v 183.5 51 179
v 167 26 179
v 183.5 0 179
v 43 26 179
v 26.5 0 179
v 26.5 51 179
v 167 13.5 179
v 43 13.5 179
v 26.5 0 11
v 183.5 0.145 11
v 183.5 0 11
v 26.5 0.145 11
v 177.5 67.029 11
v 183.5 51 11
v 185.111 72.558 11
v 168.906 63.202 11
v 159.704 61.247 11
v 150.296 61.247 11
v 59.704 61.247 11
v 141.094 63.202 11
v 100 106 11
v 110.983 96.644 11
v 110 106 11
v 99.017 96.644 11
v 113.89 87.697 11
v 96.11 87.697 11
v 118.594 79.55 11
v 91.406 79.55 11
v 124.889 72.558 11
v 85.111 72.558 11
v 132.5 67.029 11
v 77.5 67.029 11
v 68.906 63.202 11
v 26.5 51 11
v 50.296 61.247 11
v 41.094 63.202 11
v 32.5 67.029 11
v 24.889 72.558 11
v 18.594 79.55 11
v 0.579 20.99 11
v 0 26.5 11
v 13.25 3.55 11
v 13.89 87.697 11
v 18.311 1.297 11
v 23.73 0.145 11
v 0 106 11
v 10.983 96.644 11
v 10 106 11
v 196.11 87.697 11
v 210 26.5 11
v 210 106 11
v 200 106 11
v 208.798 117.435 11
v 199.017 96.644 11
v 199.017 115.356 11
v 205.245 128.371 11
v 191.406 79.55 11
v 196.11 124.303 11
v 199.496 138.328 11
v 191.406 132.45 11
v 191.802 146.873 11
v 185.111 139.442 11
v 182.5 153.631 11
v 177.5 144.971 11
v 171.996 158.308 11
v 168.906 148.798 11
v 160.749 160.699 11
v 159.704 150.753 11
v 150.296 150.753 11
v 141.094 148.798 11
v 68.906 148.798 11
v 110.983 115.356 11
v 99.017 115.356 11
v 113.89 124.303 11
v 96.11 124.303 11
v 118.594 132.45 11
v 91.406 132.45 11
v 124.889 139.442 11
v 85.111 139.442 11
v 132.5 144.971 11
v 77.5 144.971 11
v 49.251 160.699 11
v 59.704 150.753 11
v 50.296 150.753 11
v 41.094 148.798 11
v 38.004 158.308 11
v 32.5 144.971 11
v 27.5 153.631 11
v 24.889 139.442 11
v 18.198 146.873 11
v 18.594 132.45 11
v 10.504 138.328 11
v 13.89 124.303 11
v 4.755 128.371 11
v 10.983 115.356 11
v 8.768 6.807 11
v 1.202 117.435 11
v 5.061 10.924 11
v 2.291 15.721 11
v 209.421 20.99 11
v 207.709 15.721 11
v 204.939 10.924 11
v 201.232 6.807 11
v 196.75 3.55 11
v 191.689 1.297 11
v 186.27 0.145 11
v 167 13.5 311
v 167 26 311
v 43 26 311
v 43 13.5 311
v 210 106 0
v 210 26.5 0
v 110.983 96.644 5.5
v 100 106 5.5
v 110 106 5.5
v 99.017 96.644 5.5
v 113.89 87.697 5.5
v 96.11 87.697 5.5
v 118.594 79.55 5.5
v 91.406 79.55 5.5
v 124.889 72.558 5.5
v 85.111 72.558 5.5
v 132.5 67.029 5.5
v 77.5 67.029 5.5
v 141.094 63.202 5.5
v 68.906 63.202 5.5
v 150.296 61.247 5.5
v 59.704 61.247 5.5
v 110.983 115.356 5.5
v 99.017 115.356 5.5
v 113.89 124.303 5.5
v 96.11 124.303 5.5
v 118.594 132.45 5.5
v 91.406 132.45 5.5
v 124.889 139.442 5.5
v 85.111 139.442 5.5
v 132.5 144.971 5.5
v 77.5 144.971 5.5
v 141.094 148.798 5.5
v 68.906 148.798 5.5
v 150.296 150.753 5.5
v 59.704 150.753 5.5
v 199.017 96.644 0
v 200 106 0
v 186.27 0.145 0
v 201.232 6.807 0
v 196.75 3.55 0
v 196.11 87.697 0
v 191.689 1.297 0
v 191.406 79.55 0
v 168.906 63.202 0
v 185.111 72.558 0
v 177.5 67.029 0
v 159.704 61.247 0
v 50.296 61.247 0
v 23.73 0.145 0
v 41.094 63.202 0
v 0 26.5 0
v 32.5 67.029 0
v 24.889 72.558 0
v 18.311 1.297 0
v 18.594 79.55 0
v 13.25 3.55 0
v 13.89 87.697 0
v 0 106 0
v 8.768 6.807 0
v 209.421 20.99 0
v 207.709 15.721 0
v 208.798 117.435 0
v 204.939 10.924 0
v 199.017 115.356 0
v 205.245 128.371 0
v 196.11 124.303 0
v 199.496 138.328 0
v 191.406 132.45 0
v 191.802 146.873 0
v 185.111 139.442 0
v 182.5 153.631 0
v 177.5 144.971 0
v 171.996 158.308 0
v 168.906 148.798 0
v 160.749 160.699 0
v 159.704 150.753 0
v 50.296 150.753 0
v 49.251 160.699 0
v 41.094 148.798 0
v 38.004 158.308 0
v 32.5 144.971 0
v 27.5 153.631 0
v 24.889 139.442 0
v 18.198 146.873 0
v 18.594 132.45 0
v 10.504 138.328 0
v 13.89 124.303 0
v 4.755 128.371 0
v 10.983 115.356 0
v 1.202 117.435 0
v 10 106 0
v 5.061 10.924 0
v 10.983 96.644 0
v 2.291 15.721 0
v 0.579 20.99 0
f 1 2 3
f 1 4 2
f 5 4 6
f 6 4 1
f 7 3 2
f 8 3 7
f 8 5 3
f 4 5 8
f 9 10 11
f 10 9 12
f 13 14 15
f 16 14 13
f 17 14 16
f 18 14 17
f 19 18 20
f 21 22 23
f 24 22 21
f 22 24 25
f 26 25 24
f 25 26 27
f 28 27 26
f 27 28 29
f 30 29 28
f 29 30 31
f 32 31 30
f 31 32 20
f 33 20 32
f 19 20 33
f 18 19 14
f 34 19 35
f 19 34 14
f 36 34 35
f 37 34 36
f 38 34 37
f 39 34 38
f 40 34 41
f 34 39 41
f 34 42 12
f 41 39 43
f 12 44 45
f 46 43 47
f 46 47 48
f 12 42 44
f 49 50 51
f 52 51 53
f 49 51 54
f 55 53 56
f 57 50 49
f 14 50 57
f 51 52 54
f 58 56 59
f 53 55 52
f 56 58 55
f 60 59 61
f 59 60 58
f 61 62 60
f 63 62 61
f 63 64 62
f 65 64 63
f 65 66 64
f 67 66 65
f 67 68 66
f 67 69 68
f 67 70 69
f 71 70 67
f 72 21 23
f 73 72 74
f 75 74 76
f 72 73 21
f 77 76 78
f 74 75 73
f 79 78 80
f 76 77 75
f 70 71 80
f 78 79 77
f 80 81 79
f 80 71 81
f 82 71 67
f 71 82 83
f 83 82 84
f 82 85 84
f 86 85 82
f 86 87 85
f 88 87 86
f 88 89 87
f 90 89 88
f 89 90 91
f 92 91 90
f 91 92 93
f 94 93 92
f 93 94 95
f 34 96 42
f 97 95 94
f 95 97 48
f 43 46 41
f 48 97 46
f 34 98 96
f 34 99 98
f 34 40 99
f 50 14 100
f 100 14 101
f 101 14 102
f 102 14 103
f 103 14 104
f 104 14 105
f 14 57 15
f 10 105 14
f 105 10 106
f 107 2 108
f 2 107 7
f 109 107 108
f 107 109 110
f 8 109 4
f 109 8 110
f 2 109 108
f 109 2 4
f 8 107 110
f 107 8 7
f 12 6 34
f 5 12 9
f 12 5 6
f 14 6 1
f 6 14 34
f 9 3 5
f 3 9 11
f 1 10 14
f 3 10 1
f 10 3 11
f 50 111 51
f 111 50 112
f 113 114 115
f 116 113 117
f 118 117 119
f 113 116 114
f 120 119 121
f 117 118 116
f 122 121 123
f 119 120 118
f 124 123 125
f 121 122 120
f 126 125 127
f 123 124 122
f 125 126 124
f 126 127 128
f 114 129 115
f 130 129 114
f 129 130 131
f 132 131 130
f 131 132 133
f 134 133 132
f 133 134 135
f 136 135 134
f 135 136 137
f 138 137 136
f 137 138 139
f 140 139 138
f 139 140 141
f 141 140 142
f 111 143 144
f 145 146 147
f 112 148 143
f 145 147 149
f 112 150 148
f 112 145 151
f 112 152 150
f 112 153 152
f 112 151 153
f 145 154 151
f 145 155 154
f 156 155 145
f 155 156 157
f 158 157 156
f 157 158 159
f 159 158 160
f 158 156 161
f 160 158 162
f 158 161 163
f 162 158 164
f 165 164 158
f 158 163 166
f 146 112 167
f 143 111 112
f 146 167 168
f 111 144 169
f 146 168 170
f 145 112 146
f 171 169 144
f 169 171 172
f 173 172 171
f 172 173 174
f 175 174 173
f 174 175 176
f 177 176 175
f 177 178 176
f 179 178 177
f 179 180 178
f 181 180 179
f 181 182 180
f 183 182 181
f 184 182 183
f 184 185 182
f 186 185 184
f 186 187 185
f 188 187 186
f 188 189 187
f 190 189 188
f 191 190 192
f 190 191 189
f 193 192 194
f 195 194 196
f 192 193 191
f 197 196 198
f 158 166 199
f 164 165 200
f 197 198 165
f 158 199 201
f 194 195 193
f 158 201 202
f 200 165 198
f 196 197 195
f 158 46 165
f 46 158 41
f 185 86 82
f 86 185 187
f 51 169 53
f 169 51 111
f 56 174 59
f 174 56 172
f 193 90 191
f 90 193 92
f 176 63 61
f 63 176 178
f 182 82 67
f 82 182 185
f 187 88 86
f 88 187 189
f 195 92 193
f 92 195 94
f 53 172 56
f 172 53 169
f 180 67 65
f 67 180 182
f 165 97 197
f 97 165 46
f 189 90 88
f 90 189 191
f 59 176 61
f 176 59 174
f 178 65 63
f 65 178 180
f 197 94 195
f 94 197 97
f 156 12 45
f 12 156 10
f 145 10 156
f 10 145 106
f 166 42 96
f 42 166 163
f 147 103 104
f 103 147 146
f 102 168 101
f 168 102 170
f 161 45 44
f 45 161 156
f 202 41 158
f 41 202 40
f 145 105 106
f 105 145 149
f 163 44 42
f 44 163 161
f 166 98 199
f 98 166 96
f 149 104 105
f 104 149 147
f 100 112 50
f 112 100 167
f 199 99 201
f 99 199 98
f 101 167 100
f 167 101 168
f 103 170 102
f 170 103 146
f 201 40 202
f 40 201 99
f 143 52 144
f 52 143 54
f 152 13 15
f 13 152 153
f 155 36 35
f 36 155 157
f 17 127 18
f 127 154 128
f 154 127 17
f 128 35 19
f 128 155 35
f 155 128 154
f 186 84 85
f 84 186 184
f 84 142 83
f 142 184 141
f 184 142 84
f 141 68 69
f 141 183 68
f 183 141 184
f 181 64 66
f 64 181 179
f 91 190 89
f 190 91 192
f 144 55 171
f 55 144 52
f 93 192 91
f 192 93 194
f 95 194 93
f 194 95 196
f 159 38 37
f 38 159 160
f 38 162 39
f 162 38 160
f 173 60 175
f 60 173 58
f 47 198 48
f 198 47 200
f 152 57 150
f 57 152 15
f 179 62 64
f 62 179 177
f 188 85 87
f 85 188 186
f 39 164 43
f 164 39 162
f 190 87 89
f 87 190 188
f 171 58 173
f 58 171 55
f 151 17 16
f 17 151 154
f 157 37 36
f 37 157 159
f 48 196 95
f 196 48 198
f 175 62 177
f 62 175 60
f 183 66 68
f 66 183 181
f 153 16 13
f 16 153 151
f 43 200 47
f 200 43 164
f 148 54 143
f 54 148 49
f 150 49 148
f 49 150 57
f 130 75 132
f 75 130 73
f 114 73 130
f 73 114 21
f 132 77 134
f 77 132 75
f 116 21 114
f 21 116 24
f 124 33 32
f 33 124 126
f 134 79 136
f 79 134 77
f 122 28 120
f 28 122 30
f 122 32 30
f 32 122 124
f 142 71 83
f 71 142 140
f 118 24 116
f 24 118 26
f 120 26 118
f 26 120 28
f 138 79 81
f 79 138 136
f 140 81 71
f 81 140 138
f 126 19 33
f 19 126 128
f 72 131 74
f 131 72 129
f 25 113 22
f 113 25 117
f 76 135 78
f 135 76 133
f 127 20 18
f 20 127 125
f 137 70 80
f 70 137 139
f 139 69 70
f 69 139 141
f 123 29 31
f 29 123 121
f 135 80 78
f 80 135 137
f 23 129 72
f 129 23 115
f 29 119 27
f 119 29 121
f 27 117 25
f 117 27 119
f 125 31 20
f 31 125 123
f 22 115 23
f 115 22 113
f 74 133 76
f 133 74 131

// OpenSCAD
//body
translate([32,5.5,11]) {color("PaleGoldenrod"){
   cube([146,40,168]);
   translate([11,8,168]) cube([124,12.5,132]);}}

//cladding
color("BurlyWood"){
    translate([26.5,0,11]) cube([5.5,51,168]);
    translate([178,0,11]) cube([5.5,51,168]);
    translate([32,0,11]) cube([146,5.5,168]);
    translate([32,45.5,11]) cube([146,5.5,168]);
}

//base silver
color("silver") translate([0,26.5,0]){
    difference() {
        union() {color("Silver"){ cube([210,79.5,5.5]);
   hull() {
   translate([55,79.5,0]) cylinder(h = 5.5, r=55);
   translate([155,79.5,0]) cylinder(h = 5.5, r=55);}
    hull() {
   translate([26.5,0,0])cylinder(h = 5.5, r=26.5);
translate([183.5,0,0])cylinder(h = 5.5, r=26.5);}
 }
        }hull() {
    translate([55,79.5,0]) cylinder(h = 5.7, r=45);
    translate([155,79.5,0]) cylinder(h = 5.7, r=45);    
        }}}
//base brown
translate([0,26.5,5.5]){
    difference() {
        union() {color("SaddleBrown"){ cube([210,79.5,5.5]);
   hull() {
   translate([55,79.5,0]) cylinder(h = 5.5, r=55);
   translate([155,79.5,0]) cylinder(h = 5.5, r=55);}
    hull() {
   translate([26.5,0,0])cylinder(h = 5.5, r=26.5);
translate([183.5,0,0])cylinder(h = 5.5, r=26.5);}
 }
        }
    translate([55,79.5,0]) cylinder(h = 5.7, r=45);
    translate([155,79.5,0]) cylinder(h = 5.7, r=45);    
        }}
        
//translate([55,106,0]) cube([110,110,45], center=true);        
